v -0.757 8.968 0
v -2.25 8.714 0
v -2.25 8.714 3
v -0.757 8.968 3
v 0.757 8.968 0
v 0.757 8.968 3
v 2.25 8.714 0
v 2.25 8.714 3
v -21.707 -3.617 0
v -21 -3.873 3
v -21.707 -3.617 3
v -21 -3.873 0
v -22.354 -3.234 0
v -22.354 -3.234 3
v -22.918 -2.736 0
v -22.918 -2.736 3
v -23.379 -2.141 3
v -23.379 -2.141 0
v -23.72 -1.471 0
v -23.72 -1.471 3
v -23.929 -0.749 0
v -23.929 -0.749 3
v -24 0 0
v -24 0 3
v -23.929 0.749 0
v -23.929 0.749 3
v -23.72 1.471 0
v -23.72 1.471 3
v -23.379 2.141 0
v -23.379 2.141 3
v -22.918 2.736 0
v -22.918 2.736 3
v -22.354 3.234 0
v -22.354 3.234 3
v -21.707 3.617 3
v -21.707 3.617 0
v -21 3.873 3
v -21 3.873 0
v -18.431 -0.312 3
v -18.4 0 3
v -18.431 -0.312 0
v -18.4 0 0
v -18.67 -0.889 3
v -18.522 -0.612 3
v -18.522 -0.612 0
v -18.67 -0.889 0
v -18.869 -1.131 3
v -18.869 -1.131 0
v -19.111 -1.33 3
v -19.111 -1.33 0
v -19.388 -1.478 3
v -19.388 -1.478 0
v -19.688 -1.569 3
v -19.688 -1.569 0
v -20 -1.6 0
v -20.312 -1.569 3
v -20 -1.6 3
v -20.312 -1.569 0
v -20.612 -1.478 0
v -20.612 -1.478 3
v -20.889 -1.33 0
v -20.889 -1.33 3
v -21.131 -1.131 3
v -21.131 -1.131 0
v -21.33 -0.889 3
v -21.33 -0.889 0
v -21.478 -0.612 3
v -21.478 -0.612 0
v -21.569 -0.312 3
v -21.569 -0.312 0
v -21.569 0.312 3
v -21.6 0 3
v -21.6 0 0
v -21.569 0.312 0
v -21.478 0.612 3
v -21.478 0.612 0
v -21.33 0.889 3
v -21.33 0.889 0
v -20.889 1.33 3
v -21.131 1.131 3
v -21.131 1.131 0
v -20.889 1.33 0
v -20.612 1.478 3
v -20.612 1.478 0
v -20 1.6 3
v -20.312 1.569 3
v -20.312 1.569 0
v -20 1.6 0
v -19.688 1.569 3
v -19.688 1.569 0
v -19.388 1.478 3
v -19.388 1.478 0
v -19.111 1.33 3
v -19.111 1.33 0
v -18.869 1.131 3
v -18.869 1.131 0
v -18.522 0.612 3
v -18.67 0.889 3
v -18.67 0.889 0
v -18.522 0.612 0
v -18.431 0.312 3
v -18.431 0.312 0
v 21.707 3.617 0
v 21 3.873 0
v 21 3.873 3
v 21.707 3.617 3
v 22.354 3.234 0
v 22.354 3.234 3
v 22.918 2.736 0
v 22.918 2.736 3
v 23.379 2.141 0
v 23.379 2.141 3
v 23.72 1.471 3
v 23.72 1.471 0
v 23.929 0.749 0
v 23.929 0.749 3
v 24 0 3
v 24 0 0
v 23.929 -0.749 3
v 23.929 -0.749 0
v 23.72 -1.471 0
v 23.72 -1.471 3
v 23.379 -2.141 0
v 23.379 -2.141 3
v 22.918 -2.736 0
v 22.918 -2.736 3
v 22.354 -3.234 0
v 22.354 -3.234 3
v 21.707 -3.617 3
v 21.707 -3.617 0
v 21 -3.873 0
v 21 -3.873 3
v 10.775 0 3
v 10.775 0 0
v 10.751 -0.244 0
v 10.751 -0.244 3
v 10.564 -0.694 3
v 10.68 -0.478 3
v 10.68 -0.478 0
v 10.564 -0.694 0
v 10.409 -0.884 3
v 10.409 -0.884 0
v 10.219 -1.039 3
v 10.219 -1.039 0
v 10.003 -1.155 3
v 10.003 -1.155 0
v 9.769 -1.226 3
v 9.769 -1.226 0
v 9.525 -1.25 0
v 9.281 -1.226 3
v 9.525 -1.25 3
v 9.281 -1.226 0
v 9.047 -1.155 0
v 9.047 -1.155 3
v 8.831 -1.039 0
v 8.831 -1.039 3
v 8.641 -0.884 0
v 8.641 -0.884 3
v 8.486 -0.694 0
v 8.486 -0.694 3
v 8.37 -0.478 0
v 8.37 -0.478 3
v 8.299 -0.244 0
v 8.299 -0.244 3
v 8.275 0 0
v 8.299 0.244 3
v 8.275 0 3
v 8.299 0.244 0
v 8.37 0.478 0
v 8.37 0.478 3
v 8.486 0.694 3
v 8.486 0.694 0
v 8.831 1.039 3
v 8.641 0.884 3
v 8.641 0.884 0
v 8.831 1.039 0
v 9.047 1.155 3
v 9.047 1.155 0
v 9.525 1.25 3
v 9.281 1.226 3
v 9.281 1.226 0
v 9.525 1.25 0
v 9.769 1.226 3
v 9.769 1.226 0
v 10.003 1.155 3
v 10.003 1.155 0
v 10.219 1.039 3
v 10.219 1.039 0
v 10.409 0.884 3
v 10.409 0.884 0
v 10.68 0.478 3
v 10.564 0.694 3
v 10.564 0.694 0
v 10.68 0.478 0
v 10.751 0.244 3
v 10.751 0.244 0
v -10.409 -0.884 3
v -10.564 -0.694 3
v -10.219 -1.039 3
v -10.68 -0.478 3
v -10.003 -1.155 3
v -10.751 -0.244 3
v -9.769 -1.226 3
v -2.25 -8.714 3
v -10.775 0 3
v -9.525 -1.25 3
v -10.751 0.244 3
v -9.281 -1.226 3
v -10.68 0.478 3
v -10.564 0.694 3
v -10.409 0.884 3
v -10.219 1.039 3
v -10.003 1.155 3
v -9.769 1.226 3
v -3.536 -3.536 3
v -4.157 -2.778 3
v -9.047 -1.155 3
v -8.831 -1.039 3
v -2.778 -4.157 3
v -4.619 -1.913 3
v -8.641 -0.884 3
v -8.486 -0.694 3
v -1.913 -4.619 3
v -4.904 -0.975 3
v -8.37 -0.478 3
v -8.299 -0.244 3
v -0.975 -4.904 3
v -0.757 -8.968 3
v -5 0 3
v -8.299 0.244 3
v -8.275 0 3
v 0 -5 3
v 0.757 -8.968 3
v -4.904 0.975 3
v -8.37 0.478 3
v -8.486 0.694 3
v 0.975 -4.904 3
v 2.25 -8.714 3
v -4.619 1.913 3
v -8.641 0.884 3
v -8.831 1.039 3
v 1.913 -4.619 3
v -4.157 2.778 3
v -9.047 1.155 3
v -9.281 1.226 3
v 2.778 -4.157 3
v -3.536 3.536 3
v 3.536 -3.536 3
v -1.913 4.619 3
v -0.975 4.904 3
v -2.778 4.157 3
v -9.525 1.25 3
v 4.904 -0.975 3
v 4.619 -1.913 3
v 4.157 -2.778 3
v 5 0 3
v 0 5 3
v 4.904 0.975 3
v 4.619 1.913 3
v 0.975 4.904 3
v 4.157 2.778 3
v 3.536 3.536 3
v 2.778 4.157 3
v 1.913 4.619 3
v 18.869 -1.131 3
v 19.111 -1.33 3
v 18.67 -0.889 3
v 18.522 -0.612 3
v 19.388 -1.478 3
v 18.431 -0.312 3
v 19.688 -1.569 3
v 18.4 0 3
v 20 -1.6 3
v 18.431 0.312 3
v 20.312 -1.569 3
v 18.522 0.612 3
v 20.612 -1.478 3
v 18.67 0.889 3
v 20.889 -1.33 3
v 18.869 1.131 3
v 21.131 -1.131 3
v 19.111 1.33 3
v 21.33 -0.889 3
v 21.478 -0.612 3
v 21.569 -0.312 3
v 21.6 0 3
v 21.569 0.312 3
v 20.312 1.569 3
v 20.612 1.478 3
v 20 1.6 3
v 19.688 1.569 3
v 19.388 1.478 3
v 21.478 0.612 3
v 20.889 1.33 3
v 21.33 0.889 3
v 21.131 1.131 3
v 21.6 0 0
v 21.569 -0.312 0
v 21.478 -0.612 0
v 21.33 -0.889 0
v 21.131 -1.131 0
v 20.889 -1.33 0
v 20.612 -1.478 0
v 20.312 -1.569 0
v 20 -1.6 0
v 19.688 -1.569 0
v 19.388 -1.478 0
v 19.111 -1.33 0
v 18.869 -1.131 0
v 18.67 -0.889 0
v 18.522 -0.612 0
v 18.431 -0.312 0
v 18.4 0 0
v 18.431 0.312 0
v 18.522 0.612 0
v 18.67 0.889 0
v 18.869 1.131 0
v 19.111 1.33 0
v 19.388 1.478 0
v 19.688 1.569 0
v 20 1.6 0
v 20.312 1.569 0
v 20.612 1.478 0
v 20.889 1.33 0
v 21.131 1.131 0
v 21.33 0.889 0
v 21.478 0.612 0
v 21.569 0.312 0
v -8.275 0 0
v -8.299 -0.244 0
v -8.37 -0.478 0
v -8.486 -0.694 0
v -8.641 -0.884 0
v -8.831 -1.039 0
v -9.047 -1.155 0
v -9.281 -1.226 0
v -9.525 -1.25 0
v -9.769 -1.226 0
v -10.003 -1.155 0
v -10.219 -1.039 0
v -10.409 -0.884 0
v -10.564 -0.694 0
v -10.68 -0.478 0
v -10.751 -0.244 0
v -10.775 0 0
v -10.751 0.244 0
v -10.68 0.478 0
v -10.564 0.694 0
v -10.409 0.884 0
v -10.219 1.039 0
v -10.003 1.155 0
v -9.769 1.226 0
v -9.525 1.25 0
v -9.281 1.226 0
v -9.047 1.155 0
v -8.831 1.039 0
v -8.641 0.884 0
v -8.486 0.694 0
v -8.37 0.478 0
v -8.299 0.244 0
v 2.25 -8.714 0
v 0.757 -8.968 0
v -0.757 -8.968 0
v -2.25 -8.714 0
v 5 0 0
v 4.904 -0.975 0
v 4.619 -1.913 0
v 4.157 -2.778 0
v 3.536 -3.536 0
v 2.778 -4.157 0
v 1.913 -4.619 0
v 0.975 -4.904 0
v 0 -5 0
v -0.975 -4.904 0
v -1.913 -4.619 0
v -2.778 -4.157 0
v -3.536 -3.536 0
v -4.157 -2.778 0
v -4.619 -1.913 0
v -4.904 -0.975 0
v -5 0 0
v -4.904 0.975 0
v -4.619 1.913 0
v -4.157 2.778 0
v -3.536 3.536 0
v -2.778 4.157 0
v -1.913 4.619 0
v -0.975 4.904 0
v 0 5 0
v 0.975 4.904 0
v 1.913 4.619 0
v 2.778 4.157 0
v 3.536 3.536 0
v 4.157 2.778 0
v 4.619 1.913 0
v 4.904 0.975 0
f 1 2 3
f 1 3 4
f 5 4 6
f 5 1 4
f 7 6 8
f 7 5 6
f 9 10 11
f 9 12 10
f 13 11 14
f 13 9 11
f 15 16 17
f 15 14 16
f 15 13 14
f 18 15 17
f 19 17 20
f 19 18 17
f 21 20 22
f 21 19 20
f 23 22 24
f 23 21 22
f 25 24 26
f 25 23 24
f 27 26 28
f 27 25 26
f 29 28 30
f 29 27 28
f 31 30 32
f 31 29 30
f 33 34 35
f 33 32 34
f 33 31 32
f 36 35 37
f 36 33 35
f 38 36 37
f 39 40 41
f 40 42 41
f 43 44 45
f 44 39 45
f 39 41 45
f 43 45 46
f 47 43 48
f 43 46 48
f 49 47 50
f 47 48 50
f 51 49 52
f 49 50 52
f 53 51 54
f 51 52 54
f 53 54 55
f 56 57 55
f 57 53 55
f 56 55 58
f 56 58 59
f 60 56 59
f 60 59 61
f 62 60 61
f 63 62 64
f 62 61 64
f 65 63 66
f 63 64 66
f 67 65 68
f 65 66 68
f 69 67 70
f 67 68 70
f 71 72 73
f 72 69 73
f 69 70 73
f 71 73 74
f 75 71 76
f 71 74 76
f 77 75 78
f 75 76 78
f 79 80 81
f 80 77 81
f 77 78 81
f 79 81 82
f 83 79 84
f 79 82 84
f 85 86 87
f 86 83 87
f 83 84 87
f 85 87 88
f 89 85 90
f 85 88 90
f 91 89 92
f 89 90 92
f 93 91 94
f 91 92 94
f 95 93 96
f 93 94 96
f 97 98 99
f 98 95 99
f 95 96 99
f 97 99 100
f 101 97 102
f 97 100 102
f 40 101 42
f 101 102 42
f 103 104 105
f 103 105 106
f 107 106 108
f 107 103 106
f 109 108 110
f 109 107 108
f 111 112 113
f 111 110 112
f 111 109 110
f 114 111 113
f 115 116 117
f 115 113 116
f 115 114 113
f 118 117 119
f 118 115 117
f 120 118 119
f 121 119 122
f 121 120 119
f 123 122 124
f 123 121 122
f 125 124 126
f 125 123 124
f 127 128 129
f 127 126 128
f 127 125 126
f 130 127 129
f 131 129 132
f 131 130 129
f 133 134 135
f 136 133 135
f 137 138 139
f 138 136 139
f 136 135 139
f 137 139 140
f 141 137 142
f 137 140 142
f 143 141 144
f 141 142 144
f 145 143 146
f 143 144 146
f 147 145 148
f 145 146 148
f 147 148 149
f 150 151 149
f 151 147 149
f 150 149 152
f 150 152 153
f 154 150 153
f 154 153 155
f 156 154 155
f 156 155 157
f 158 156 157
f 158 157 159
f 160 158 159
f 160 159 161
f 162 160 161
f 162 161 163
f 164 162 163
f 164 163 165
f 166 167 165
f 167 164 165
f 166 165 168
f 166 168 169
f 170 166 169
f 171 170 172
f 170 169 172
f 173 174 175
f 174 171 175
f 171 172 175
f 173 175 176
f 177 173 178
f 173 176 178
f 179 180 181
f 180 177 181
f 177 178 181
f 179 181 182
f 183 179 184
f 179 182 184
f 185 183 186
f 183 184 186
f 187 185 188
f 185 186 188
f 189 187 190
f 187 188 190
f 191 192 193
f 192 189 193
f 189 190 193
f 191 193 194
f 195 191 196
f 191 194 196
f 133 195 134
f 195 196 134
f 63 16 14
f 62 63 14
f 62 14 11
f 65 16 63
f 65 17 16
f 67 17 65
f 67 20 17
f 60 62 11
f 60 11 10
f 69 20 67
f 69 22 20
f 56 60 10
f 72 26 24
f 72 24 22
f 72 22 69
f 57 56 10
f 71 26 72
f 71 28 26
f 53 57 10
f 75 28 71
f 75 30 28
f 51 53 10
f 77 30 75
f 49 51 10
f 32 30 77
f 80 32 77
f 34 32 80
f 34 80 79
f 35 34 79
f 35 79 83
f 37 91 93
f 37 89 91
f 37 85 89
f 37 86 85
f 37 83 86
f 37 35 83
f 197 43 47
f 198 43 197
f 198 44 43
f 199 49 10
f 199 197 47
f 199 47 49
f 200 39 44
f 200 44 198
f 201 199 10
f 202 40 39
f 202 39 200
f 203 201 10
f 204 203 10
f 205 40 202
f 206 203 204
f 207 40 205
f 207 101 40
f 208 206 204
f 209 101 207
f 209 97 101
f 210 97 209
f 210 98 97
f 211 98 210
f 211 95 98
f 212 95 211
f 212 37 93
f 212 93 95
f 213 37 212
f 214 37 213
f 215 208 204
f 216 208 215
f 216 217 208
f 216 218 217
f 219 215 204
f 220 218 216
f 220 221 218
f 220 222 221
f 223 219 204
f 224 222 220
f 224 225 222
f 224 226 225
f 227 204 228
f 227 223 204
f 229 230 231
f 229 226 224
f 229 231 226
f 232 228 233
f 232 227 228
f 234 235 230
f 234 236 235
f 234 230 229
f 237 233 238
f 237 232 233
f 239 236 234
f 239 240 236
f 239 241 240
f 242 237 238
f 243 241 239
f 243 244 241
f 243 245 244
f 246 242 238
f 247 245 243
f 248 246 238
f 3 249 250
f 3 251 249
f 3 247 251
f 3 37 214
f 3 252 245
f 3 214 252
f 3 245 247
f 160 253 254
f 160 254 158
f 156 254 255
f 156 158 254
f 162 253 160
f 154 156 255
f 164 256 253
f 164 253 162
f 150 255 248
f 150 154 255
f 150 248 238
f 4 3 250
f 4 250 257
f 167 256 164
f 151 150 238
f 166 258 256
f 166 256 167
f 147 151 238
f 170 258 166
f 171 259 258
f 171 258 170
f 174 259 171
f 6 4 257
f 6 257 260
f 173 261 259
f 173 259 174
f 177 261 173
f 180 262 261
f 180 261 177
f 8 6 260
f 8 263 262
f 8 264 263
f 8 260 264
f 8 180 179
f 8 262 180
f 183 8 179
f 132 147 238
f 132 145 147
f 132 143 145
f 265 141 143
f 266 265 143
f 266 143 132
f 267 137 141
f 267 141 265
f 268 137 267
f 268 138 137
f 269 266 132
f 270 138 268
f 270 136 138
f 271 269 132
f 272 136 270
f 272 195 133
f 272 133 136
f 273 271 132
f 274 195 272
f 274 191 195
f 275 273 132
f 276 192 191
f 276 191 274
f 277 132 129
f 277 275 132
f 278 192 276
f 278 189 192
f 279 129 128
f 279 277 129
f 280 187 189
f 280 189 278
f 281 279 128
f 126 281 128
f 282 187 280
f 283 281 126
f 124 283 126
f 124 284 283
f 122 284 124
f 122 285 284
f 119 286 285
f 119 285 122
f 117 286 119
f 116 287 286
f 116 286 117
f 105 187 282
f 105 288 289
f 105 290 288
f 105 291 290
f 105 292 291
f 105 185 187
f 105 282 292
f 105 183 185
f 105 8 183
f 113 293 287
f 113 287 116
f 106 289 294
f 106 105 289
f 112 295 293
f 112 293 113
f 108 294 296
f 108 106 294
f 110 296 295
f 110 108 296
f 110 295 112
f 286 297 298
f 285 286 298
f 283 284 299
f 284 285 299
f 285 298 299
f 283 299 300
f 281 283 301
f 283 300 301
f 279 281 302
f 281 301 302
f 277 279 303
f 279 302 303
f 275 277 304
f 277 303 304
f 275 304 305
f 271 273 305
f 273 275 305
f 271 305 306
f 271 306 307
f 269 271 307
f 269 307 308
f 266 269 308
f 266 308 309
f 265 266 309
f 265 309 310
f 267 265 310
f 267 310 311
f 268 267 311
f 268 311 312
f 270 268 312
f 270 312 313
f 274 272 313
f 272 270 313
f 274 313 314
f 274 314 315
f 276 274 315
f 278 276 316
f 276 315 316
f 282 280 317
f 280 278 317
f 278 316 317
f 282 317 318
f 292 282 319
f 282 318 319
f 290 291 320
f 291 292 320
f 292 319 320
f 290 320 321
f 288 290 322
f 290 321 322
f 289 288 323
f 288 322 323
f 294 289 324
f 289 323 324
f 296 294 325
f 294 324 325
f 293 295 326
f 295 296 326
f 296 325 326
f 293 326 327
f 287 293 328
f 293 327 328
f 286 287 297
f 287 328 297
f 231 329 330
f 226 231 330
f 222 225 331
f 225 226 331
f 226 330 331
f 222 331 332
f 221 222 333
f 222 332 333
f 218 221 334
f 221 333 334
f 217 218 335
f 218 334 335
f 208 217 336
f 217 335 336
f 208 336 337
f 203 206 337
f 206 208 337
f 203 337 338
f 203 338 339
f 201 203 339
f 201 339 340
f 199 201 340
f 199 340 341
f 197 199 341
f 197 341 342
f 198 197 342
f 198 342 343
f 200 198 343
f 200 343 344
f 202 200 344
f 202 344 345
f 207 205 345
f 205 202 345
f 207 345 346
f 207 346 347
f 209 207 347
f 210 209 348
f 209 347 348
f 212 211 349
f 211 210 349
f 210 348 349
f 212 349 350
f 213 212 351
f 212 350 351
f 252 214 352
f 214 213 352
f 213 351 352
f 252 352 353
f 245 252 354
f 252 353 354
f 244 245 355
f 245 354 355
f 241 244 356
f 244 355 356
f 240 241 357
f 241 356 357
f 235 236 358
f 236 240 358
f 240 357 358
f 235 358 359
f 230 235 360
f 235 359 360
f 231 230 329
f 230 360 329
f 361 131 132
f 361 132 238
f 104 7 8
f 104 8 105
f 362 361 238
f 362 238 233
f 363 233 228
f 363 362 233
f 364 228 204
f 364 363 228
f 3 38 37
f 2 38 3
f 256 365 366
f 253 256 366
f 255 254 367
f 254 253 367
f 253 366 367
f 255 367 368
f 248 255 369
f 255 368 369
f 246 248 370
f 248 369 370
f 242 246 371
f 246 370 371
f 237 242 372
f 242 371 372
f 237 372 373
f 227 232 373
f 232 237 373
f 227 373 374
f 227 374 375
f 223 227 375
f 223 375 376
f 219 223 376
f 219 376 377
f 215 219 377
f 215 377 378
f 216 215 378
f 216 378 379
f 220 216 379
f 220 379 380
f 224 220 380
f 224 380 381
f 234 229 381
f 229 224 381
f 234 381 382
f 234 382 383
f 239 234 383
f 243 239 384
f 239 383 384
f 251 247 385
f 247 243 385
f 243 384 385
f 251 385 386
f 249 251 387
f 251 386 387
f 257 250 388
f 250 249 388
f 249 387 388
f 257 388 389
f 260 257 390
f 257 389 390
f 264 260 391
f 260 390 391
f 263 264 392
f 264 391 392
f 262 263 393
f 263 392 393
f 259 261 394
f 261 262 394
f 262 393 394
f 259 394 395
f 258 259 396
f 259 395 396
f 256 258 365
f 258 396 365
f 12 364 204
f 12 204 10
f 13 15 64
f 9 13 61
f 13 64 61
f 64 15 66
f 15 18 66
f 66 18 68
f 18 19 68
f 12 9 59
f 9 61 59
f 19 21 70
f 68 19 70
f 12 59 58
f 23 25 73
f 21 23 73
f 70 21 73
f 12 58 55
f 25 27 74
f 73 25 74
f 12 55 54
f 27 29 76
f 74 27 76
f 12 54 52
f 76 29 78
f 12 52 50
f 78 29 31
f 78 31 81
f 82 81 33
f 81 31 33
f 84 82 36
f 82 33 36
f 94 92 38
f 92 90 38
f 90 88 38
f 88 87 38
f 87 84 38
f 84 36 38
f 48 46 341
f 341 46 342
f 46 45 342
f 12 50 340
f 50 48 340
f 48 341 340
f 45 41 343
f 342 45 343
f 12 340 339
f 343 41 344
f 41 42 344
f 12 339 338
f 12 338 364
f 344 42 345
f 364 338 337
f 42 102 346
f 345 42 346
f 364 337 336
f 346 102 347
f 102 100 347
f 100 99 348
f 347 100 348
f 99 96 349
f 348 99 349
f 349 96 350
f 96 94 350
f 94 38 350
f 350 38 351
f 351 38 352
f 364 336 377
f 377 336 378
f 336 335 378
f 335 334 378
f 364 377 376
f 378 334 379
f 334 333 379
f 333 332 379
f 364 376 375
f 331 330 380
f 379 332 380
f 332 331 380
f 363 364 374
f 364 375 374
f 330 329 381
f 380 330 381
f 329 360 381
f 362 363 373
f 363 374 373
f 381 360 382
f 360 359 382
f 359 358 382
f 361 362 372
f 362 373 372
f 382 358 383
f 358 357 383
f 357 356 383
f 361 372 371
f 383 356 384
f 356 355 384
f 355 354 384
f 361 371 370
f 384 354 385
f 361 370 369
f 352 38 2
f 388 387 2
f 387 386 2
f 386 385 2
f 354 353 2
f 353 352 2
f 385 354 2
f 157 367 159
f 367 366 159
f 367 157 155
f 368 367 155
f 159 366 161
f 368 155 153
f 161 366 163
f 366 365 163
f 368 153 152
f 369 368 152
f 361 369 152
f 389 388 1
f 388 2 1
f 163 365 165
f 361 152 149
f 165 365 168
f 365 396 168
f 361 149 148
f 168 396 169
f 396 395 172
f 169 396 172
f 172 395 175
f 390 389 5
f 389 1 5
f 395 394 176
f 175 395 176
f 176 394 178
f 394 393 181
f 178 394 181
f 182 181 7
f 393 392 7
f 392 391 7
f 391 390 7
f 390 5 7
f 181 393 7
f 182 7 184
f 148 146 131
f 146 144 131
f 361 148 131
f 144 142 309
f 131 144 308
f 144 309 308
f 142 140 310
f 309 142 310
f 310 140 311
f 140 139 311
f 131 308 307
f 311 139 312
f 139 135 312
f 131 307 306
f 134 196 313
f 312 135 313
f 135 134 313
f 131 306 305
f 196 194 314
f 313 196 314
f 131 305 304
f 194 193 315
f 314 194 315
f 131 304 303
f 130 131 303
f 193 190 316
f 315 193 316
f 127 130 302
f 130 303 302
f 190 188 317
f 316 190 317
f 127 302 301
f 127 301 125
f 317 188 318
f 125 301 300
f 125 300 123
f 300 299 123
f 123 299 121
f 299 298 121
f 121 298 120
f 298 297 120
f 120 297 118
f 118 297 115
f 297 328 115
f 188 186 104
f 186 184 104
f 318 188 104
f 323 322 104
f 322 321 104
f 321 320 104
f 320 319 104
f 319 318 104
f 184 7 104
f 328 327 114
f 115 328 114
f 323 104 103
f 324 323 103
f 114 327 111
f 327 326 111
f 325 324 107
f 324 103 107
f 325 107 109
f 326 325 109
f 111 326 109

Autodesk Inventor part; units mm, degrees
ref_plane "YZ Plane" through (0, 0, 0) normal (1, 0, 0) x (0, 1, 0)
ref_plane "XZ Plane" through (0, 0, 0) normal (0, 1, 0) x (-1, 0, 0)
ref_plane "XY Plane" through (0, 0, 0) normal (0, 0, 1) x (1, 0, 0)
sketch "スケッチ1" plane through (0, 0, 0) normal (0, 0, 1) x (1, 0, 0)
  circle A0 centre (0, 0) radius 5
  circle A1 centre (-20, 0) radius 1.6
  circle A2 centre (20, 0) radius 1.6
  circle A3 centre (-9.525, 0) radius 1.25
  circle A4 centre (9.525, 0) radius 1.25
  line L0 (-20, 0) -> (20, 0) construction
  arc A5 (-21, 3.873) -> (-21, -3.873) centre (-20, 0) ccw
  arc A6 (21, -3.873) -> (21, 3.873) centre (20, 0) ccw
  arc A7 (2.25, 8.7142) -> (-2.25, 8.7142) centre (0, 0) ccw
  arc A8 (-2.25, -8.7142) -> (2.25, -8.7142) centre (0, 0) ccw
  line L1 (-21, 3.873) -> (-2.25, 8.7142)
  line L2 (2.25, 8.7142) -> (21, 3.873)
  line L3 (21, -3.873) -> (2.25, -8.7142)
  line L4 (-2.25, -8.7142) -> (-21, -3.873)
  dimension "d0" = 10
  dimension "d1" = 3.2
  dimension "d2" = 3.2
  dimension "d3" = 40
  dimension "d4" = 20
  dimension "d5" = 2.5
  dimension "d6" = 2.5
  dimension "d7" = 19.05
  dimension "d8" = 9.525
  dimension "d9" = 4
  dimension "d10" = 4
  dimension "d11" = 9
  dimension "d12" = 9
extrude "押し出し1" add sketch "スケッチ1" along normal blind 3
equation "\"d8\" = 0.5 * d7"
properties part number "エンコーダマウント" material "ポリカーボネート、スモーク"
